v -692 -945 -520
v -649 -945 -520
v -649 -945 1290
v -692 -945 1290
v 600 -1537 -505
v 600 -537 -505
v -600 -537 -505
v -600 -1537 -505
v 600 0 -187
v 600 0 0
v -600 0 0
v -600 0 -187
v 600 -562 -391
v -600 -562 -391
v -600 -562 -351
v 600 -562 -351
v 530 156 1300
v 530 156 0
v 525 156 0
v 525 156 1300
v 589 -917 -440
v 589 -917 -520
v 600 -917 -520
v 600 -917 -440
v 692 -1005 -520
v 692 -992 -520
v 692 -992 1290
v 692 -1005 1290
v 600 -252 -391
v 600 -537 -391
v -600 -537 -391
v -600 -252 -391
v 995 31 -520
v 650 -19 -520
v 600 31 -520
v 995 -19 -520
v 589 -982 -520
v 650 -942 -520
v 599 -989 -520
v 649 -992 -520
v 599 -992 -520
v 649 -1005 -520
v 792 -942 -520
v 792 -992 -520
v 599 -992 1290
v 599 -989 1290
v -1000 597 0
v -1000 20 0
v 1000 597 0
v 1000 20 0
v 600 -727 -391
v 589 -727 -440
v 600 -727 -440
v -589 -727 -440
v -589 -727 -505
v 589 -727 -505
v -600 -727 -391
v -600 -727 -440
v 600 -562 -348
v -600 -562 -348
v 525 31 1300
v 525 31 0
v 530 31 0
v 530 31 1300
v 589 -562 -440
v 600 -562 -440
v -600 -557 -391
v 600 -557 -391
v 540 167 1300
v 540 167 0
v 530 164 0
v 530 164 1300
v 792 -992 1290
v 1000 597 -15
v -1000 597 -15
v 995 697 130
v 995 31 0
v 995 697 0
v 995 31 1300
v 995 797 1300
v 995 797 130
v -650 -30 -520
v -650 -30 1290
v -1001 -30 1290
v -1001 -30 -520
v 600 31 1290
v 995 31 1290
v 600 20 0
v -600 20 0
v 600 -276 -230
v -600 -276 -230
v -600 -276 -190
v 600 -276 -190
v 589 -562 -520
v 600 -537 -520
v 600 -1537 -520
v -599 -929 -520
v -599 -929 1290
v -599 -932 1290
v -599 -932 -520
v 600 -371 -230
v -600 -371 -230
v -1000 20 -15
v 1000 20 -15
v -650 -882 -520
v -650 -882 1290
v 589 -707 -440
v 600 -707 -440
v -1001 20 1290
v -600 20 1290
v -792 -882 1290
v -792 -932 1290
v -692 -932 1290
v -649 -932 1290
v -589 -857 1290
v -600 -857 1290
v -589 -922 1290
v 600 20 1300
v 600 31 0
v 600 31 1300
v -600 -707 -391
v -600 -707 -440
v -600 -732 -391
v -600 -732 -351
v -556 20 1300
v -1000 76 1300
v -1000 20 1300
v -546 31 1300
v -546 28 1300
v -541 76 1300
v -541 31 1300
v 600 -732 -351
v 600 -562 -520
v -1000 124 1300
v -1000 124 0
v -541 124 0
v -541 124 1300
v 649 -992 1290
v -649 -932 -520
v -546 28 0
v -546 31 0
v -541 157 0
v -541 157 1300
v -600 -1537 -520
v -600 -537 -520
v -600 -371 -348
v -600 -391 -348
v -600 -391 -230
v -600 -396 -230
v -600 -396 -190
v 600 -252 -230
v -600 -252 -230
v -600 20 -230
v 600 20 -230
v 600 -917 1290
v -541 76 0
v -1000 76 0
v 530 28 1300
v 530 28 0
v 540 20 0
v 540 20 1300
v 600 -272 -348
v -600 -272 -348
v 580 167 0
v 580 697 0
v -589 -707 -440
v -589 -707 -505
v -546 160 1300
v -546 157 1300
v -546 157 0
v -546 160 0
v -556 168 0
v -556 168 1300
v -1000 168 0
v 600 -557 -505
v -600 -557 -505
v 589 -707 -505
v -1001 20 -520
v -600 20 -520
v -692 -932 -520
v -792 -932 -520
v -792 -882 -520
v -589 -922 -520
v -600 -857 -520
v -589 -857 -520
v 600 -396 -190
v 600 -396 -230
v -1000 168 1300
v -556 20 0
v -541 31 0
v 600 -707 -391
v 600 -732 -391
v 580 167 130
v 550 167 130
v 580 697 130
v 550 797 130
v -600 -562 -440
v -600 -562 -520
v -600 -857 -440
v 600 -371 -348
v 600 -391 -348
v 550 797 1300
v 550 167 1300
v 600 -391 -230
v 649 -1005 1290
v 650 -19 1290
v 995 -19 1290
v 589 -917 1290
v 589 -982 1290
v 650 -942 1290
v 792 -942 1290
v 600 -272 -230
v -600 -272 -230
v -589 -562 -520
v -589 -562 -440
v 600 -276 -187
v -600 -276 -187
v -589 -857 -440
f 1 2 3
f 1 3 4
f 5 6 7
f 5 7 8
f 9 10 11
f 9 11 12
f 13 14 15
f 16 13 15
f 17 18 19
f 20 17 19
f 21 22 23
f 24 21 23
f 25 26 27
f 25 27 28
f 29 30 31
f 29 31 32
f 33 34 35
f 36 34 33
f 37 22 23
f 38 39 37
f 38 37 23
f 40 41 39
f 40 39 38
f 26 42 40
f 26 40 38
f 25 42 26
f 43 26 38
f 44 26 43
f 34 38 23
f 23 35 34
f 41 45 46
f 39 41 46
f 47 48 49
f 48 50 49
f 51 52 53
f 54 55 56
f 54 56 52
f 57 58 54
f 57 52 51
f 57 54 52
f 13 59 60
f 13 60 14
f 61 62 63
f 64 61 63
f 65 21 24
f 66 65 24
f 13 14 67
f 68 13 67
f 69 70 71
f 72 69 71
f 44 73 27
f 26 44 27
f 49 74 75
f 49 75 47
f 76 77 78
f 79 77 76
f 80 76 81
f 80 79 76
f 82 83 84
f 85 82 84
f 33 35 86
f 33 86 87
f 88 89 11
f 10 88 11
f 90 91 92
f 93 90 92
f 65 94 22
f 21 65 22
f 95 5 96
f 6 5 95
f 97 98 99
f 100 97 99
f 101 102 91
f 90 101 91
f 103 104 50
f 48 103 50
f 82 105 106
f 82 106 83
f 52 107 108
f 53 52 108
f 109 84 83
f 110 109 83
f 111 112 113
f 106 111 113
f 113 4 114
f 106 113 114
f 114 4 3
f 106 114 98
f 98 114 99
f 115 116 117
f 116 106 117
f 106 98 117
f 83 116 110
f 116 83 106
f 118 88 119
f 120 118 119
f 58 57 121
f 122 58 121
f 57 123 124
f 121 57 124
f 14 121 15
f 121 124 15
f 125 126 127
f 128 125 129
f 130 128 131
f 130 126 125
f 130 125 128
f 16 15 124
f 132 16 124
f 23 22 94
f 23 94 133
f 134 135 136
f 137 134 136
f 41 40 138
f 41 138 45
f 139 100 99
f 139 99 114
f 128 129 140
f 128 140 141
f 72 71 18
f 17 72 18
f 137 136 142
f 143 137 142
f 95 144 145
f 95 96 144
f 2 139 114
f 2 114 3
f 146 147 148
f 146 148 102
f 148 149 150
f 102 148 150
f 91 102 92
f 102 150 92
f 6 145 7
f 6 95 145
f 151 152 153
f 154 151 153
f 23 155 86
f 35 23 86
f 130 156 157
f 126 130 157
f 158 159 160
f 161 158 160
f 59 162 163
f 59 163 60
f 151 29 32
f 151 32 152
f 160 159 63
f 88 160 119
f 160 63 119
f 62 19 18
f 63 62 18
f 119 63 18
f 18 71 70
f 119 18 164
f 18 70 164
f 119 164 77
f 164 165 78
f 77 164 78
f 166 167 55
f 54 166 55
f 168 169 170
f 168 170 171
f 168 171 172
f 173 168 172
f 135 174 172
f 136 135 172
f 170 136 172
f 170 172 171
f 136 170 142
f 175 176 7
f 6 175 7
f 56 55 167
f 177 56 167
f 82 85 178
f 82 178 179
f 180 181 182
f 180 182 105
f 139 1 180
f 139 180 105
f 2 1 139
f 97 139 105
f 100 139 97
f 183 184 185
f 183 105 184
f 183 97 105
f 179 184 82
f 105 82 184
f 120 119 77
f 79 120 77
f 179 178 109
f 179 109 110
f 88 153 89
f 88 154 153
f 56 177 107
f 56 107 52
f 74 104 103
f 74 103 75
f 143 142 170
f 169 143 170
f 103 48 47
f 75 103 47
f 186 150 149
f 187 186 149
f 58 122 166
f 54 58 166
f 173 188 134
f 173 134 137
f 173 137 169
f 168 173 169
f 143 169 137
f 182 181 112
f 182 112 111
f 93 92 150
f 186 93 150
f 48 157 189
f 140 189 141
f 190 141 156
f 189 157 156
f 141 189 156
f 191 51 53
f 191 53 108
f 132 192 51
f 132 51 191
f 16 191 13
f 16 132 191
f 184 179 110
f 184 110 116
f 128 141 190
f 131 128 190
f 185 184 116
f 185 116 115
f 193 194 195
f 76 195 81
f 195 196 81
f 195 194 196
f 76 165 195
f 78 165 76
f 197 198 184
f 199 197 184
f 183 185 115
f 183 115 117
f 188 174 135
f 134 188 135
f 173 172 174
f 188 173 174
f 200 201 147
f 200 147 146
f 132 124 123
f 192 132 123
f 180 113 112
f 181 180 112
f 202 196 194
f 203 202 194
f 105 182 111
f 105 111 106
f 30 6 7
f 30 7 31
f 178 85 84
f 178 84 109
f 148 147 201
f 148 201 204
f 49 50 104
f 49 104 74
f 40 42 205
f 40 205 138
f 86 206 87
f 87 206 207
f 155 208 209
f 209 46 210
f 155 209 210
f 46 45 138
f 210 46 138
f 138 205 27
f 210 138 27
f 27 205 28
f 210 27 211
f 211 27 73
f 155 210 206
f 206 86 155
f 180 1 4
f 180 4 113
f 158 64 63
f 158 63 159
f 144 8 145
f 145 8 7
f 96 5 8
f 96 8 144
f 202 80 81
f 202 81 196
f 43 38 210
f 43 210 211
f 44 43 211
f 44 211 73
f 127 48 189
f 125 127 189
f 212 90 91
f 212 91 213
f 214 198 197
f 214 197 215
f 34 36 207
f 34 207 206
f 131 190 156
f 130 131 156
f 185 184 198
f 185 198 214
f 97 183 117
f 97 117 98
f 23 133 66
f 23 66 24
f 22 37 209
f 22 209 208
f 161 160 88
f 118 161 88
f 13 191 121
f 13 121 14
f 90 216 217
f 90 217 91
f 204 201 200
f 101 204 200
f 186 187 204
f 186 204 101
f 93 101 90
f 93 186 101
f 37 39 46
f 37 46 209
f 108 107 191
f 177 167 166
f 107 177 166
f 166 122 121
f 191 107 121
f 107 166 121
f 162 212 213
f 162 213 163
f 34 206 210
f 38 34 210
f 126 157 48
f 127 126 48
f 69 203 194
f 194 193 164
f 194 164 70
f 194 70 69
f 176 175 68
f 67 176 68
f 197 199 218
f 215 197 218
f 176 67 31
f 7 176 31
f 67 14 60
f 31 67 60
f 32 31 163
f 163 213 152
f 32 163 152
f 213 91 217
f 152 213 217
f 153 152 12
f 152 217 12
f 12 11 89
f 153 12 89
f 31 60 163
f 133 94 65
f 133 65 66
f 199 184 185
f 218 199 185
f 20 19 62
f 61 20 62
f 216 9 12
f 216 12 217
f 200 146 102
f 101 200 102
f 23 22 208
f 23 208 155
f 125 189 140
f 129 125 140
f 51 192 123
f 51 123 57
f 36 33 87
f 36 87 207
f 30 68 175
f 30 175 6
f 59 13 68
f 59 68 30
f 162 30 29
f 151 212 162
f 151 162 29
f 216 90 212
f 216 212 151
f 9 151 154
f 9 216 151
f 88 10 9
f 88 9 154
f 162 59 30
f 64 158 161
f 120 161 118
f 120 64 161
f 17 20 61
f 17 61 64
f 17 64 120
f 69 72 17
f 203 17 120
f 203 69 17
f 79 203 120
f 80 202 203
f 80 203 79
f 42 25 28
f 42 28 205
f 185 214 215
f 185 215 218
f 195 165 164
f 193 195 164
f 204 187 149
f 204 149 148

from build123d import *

# Parameters (mm, degrees)
F0_W      = 20
F0_H      = 114
F1_DEPTH  = 600
F2_DEPTH  = 600
F0_W_2    = 577
F0_H_2    = 15
F3_DEPTH  = 1000
F5_DEPTH  = 1300
F4_W      = 415
F4_H      = 430
F4_H_2    = 100
F7_DEPTH  = 1170
F10_DEPTH = 1810
F9_W      = 11
F9_H      = 355
F11_DEPTH = 80
F9_H_2    = 295
F12_W     = 20
F12_H     = 118
F13_DEPTH = 1200
F12_H_2   = 114


with BuildPart() as f1:
    # F0 (on Right) → F1 (new body, symmetric)
    with BuildSketch(Plane.YZ):
        Polygon((20, 0), (0, 0), (0, -187), (20, -187), (20, -15), align=None)
        Polygon((20, -187), (0, -187), (-276, -187), (-276, -230), (-272, -230), (-252, -230), (20, -230), align=None)
        Polygon((-252, -391), (-252, -230), (-272, -230), (-272, -348), (-272, -391), align=None)
        Polygon((-272, -391), (-272, -348), (-562, -348), (-562, -391), (-557, -391), (-537, -391), align=None)
        with Locations((-547, -448)):
            Rectangle(F0_W, F0_H)
    extrude(amount=F1_DEPTH, both=True)


with BuildPart() as f2:
    # F0 (on Right) → F2 (new body, symmetric)
    with BuildSketch(Plane.YZ):
        Polygon((-537, -520), (-537, -505), (-557, -505), (-1537, -505), (-1537, -520), align=None)
    extrude(amount=F2_DEPTH, both=True)


with BuildPart() as f3:
    # F0 (on Right) → F3 (new body, symmetric)
    with BuildSketch(Plane.YZ):
        with Locations((308.5, -7.5)):
            Rectangle(F0_W_2, F0_H_2)
    extrude(amount=F3_DEPTH, both=True)


with BuildPart() as f5:
    # F4 (on face) → F5 (new body)
    with BuildSketch(Plane.XY):
        Polygon((-600, 20), (-556, 20), (-546, 28), (-546, 31), (-541, 31), (-541, 76), (-1000, 76), (-1000, 20), align=None)
    extrude(amount=F5_DEPTH)


with BuildPart() as f5b:
    # F4 (on face) → F5, piece 2 (new body)
    with BuildSketch(Plane.XY):
        Polygon((-1000, 168), (-1000, 124), (-541, 124), (-541, 157), (-546, 157), (-546, 160), (-556, 168), (-600, 168), align=None)
    extrude(amount=F5_DEPTH)


with BuildPart() as f5c:
    # F4 (on face) → F5, piece 3 (new body)
    with BuildSketch(Plane.XY):
        Polygon((530, 31), (600, 31), (995, 31), (995, 167), (580, 167), (540, 167), (530, 164), (530, 156), (525, 156), (525, 31), align=None)
        with Locations((787.5, 382)):
            Rectangle(F4_W, F4_H)
        with Locations((787.5, 647)):
            Rectangle(F4_W, F4_H_2)
        Polygon((540, 20), (600, 20), (600, 31), (530, 31), (530, 28), align=None)
    extrude(amount=F5_DEPTH)

    # F6 (on face) → F7 (join)
    with BuildSketch(Plane.XY.offset(1300)):
        Polygon((550, 797), (550, 167), (580, 167), (580, 697), (995, 697), (995, 797), align=None)
    extrude(amount=-F7_DEPTH)


with BuildPart() as f10:
    # F9 (on offset) → F10 (new body)
    with BuildSketch(Plane(origin=(0, 0, -520), x_dir=(1, 0, 0), z_dir=(0, 0, -1))):
        Polygon((600, -31), (995, -31), (995, 19), (650, 19), (650, 942), (792, 942), (792, 992), (692, 992), (692, 1005), (649, 1005), (649, 992), (599, 992), (599, 989), (589, 982), (589, 917), (600, 917), (600, 562), align=None)
    extrude(amount=-F10_DEPTH)


with BuildPart() as f10b:
    # F9 (on offset) → F10, piece 2 (new body)
    with BuildSketch(Plane(origin=(0, 0, -520), x_dir=(1, 0, 0), z_dir=(0, 0, -1))):
        Polygon((-1001, 30), (-1001, -20), (-600, -20), (-600, 562), (-600, 857), (-589, 857), (-589, 922), (-599, 929), (-599, 932), (-649, 932), (-649, 945), (-692, 945), (-692, 932), (-792, 932), (-792, 882), (-650, 882), (-650, 30), align=None)
    extrude(amount=-F10_DEPTH)


with BuildPart() as f11:
    # F9 (on offset) → F11 (new body)
    with BuildSketch(Plane(origin=(0, 0, -520), x_dir=(1, 0, 0), z_dir=(0, 0, -1))):
        with Locations((594.5, 739.5)):
            Rectangle(F9_W, F9_H)
    extrude(amount=-F11_DEPTH)


with BuildPart() as f11b:
    # F9 (on offset) → F11, piece 2 (new body)
    with BuildSketch(Plane(origin=(0, 0, -520), x_dir=(1, 0, 0), z_dir=(0, 0, -1))):
        with Locations((-594.5, 709.5)):
            Rectangle(F9_W, F9_H_2)
    extrude(amount=-F11_DEPTH)


with BuildPart() as f13:
    # F12 (on face) → F13 (new body)
    with BuildSketch(Plane.YZ.offset(-600)):
        Polygon((-371, -230), (-276, -230), (-276, -190), (-396, -190), (-396, -230), (-391, -230), align=None)
        with Locations((-381, -289)):
            Rectangle(F12_W, F12_H)
    extrude(amount=F13_DEPTH)


with BuildPart() as f13b:
    # F12 (on face) → F13, piece 2 (new body)
    with BuildSketch(Plane.YZ.offset(-600)):
        Polygon((-707, -391), (-562, -391), (-562, -351), (-732, -351), (-732, -391), (-727, -391), align=None)
        with Locations((-717, -448)):
            Rectangle(F12_W, F12_H_2)
    extrude(amount=F13_DEPTH)

    # F14: cut F11b, F11
    add(f11b.part, mode=Mode.SUBTRACT)
    add(f11.part, mode=Mode.SUBTRACT)


solid = Compound([f1.part, f2.part, f3.part, f5.part, f5b.part, f5c.part, f10.part, f10b.part, f11.part, f11b.part, f13.part, f13b.part])
